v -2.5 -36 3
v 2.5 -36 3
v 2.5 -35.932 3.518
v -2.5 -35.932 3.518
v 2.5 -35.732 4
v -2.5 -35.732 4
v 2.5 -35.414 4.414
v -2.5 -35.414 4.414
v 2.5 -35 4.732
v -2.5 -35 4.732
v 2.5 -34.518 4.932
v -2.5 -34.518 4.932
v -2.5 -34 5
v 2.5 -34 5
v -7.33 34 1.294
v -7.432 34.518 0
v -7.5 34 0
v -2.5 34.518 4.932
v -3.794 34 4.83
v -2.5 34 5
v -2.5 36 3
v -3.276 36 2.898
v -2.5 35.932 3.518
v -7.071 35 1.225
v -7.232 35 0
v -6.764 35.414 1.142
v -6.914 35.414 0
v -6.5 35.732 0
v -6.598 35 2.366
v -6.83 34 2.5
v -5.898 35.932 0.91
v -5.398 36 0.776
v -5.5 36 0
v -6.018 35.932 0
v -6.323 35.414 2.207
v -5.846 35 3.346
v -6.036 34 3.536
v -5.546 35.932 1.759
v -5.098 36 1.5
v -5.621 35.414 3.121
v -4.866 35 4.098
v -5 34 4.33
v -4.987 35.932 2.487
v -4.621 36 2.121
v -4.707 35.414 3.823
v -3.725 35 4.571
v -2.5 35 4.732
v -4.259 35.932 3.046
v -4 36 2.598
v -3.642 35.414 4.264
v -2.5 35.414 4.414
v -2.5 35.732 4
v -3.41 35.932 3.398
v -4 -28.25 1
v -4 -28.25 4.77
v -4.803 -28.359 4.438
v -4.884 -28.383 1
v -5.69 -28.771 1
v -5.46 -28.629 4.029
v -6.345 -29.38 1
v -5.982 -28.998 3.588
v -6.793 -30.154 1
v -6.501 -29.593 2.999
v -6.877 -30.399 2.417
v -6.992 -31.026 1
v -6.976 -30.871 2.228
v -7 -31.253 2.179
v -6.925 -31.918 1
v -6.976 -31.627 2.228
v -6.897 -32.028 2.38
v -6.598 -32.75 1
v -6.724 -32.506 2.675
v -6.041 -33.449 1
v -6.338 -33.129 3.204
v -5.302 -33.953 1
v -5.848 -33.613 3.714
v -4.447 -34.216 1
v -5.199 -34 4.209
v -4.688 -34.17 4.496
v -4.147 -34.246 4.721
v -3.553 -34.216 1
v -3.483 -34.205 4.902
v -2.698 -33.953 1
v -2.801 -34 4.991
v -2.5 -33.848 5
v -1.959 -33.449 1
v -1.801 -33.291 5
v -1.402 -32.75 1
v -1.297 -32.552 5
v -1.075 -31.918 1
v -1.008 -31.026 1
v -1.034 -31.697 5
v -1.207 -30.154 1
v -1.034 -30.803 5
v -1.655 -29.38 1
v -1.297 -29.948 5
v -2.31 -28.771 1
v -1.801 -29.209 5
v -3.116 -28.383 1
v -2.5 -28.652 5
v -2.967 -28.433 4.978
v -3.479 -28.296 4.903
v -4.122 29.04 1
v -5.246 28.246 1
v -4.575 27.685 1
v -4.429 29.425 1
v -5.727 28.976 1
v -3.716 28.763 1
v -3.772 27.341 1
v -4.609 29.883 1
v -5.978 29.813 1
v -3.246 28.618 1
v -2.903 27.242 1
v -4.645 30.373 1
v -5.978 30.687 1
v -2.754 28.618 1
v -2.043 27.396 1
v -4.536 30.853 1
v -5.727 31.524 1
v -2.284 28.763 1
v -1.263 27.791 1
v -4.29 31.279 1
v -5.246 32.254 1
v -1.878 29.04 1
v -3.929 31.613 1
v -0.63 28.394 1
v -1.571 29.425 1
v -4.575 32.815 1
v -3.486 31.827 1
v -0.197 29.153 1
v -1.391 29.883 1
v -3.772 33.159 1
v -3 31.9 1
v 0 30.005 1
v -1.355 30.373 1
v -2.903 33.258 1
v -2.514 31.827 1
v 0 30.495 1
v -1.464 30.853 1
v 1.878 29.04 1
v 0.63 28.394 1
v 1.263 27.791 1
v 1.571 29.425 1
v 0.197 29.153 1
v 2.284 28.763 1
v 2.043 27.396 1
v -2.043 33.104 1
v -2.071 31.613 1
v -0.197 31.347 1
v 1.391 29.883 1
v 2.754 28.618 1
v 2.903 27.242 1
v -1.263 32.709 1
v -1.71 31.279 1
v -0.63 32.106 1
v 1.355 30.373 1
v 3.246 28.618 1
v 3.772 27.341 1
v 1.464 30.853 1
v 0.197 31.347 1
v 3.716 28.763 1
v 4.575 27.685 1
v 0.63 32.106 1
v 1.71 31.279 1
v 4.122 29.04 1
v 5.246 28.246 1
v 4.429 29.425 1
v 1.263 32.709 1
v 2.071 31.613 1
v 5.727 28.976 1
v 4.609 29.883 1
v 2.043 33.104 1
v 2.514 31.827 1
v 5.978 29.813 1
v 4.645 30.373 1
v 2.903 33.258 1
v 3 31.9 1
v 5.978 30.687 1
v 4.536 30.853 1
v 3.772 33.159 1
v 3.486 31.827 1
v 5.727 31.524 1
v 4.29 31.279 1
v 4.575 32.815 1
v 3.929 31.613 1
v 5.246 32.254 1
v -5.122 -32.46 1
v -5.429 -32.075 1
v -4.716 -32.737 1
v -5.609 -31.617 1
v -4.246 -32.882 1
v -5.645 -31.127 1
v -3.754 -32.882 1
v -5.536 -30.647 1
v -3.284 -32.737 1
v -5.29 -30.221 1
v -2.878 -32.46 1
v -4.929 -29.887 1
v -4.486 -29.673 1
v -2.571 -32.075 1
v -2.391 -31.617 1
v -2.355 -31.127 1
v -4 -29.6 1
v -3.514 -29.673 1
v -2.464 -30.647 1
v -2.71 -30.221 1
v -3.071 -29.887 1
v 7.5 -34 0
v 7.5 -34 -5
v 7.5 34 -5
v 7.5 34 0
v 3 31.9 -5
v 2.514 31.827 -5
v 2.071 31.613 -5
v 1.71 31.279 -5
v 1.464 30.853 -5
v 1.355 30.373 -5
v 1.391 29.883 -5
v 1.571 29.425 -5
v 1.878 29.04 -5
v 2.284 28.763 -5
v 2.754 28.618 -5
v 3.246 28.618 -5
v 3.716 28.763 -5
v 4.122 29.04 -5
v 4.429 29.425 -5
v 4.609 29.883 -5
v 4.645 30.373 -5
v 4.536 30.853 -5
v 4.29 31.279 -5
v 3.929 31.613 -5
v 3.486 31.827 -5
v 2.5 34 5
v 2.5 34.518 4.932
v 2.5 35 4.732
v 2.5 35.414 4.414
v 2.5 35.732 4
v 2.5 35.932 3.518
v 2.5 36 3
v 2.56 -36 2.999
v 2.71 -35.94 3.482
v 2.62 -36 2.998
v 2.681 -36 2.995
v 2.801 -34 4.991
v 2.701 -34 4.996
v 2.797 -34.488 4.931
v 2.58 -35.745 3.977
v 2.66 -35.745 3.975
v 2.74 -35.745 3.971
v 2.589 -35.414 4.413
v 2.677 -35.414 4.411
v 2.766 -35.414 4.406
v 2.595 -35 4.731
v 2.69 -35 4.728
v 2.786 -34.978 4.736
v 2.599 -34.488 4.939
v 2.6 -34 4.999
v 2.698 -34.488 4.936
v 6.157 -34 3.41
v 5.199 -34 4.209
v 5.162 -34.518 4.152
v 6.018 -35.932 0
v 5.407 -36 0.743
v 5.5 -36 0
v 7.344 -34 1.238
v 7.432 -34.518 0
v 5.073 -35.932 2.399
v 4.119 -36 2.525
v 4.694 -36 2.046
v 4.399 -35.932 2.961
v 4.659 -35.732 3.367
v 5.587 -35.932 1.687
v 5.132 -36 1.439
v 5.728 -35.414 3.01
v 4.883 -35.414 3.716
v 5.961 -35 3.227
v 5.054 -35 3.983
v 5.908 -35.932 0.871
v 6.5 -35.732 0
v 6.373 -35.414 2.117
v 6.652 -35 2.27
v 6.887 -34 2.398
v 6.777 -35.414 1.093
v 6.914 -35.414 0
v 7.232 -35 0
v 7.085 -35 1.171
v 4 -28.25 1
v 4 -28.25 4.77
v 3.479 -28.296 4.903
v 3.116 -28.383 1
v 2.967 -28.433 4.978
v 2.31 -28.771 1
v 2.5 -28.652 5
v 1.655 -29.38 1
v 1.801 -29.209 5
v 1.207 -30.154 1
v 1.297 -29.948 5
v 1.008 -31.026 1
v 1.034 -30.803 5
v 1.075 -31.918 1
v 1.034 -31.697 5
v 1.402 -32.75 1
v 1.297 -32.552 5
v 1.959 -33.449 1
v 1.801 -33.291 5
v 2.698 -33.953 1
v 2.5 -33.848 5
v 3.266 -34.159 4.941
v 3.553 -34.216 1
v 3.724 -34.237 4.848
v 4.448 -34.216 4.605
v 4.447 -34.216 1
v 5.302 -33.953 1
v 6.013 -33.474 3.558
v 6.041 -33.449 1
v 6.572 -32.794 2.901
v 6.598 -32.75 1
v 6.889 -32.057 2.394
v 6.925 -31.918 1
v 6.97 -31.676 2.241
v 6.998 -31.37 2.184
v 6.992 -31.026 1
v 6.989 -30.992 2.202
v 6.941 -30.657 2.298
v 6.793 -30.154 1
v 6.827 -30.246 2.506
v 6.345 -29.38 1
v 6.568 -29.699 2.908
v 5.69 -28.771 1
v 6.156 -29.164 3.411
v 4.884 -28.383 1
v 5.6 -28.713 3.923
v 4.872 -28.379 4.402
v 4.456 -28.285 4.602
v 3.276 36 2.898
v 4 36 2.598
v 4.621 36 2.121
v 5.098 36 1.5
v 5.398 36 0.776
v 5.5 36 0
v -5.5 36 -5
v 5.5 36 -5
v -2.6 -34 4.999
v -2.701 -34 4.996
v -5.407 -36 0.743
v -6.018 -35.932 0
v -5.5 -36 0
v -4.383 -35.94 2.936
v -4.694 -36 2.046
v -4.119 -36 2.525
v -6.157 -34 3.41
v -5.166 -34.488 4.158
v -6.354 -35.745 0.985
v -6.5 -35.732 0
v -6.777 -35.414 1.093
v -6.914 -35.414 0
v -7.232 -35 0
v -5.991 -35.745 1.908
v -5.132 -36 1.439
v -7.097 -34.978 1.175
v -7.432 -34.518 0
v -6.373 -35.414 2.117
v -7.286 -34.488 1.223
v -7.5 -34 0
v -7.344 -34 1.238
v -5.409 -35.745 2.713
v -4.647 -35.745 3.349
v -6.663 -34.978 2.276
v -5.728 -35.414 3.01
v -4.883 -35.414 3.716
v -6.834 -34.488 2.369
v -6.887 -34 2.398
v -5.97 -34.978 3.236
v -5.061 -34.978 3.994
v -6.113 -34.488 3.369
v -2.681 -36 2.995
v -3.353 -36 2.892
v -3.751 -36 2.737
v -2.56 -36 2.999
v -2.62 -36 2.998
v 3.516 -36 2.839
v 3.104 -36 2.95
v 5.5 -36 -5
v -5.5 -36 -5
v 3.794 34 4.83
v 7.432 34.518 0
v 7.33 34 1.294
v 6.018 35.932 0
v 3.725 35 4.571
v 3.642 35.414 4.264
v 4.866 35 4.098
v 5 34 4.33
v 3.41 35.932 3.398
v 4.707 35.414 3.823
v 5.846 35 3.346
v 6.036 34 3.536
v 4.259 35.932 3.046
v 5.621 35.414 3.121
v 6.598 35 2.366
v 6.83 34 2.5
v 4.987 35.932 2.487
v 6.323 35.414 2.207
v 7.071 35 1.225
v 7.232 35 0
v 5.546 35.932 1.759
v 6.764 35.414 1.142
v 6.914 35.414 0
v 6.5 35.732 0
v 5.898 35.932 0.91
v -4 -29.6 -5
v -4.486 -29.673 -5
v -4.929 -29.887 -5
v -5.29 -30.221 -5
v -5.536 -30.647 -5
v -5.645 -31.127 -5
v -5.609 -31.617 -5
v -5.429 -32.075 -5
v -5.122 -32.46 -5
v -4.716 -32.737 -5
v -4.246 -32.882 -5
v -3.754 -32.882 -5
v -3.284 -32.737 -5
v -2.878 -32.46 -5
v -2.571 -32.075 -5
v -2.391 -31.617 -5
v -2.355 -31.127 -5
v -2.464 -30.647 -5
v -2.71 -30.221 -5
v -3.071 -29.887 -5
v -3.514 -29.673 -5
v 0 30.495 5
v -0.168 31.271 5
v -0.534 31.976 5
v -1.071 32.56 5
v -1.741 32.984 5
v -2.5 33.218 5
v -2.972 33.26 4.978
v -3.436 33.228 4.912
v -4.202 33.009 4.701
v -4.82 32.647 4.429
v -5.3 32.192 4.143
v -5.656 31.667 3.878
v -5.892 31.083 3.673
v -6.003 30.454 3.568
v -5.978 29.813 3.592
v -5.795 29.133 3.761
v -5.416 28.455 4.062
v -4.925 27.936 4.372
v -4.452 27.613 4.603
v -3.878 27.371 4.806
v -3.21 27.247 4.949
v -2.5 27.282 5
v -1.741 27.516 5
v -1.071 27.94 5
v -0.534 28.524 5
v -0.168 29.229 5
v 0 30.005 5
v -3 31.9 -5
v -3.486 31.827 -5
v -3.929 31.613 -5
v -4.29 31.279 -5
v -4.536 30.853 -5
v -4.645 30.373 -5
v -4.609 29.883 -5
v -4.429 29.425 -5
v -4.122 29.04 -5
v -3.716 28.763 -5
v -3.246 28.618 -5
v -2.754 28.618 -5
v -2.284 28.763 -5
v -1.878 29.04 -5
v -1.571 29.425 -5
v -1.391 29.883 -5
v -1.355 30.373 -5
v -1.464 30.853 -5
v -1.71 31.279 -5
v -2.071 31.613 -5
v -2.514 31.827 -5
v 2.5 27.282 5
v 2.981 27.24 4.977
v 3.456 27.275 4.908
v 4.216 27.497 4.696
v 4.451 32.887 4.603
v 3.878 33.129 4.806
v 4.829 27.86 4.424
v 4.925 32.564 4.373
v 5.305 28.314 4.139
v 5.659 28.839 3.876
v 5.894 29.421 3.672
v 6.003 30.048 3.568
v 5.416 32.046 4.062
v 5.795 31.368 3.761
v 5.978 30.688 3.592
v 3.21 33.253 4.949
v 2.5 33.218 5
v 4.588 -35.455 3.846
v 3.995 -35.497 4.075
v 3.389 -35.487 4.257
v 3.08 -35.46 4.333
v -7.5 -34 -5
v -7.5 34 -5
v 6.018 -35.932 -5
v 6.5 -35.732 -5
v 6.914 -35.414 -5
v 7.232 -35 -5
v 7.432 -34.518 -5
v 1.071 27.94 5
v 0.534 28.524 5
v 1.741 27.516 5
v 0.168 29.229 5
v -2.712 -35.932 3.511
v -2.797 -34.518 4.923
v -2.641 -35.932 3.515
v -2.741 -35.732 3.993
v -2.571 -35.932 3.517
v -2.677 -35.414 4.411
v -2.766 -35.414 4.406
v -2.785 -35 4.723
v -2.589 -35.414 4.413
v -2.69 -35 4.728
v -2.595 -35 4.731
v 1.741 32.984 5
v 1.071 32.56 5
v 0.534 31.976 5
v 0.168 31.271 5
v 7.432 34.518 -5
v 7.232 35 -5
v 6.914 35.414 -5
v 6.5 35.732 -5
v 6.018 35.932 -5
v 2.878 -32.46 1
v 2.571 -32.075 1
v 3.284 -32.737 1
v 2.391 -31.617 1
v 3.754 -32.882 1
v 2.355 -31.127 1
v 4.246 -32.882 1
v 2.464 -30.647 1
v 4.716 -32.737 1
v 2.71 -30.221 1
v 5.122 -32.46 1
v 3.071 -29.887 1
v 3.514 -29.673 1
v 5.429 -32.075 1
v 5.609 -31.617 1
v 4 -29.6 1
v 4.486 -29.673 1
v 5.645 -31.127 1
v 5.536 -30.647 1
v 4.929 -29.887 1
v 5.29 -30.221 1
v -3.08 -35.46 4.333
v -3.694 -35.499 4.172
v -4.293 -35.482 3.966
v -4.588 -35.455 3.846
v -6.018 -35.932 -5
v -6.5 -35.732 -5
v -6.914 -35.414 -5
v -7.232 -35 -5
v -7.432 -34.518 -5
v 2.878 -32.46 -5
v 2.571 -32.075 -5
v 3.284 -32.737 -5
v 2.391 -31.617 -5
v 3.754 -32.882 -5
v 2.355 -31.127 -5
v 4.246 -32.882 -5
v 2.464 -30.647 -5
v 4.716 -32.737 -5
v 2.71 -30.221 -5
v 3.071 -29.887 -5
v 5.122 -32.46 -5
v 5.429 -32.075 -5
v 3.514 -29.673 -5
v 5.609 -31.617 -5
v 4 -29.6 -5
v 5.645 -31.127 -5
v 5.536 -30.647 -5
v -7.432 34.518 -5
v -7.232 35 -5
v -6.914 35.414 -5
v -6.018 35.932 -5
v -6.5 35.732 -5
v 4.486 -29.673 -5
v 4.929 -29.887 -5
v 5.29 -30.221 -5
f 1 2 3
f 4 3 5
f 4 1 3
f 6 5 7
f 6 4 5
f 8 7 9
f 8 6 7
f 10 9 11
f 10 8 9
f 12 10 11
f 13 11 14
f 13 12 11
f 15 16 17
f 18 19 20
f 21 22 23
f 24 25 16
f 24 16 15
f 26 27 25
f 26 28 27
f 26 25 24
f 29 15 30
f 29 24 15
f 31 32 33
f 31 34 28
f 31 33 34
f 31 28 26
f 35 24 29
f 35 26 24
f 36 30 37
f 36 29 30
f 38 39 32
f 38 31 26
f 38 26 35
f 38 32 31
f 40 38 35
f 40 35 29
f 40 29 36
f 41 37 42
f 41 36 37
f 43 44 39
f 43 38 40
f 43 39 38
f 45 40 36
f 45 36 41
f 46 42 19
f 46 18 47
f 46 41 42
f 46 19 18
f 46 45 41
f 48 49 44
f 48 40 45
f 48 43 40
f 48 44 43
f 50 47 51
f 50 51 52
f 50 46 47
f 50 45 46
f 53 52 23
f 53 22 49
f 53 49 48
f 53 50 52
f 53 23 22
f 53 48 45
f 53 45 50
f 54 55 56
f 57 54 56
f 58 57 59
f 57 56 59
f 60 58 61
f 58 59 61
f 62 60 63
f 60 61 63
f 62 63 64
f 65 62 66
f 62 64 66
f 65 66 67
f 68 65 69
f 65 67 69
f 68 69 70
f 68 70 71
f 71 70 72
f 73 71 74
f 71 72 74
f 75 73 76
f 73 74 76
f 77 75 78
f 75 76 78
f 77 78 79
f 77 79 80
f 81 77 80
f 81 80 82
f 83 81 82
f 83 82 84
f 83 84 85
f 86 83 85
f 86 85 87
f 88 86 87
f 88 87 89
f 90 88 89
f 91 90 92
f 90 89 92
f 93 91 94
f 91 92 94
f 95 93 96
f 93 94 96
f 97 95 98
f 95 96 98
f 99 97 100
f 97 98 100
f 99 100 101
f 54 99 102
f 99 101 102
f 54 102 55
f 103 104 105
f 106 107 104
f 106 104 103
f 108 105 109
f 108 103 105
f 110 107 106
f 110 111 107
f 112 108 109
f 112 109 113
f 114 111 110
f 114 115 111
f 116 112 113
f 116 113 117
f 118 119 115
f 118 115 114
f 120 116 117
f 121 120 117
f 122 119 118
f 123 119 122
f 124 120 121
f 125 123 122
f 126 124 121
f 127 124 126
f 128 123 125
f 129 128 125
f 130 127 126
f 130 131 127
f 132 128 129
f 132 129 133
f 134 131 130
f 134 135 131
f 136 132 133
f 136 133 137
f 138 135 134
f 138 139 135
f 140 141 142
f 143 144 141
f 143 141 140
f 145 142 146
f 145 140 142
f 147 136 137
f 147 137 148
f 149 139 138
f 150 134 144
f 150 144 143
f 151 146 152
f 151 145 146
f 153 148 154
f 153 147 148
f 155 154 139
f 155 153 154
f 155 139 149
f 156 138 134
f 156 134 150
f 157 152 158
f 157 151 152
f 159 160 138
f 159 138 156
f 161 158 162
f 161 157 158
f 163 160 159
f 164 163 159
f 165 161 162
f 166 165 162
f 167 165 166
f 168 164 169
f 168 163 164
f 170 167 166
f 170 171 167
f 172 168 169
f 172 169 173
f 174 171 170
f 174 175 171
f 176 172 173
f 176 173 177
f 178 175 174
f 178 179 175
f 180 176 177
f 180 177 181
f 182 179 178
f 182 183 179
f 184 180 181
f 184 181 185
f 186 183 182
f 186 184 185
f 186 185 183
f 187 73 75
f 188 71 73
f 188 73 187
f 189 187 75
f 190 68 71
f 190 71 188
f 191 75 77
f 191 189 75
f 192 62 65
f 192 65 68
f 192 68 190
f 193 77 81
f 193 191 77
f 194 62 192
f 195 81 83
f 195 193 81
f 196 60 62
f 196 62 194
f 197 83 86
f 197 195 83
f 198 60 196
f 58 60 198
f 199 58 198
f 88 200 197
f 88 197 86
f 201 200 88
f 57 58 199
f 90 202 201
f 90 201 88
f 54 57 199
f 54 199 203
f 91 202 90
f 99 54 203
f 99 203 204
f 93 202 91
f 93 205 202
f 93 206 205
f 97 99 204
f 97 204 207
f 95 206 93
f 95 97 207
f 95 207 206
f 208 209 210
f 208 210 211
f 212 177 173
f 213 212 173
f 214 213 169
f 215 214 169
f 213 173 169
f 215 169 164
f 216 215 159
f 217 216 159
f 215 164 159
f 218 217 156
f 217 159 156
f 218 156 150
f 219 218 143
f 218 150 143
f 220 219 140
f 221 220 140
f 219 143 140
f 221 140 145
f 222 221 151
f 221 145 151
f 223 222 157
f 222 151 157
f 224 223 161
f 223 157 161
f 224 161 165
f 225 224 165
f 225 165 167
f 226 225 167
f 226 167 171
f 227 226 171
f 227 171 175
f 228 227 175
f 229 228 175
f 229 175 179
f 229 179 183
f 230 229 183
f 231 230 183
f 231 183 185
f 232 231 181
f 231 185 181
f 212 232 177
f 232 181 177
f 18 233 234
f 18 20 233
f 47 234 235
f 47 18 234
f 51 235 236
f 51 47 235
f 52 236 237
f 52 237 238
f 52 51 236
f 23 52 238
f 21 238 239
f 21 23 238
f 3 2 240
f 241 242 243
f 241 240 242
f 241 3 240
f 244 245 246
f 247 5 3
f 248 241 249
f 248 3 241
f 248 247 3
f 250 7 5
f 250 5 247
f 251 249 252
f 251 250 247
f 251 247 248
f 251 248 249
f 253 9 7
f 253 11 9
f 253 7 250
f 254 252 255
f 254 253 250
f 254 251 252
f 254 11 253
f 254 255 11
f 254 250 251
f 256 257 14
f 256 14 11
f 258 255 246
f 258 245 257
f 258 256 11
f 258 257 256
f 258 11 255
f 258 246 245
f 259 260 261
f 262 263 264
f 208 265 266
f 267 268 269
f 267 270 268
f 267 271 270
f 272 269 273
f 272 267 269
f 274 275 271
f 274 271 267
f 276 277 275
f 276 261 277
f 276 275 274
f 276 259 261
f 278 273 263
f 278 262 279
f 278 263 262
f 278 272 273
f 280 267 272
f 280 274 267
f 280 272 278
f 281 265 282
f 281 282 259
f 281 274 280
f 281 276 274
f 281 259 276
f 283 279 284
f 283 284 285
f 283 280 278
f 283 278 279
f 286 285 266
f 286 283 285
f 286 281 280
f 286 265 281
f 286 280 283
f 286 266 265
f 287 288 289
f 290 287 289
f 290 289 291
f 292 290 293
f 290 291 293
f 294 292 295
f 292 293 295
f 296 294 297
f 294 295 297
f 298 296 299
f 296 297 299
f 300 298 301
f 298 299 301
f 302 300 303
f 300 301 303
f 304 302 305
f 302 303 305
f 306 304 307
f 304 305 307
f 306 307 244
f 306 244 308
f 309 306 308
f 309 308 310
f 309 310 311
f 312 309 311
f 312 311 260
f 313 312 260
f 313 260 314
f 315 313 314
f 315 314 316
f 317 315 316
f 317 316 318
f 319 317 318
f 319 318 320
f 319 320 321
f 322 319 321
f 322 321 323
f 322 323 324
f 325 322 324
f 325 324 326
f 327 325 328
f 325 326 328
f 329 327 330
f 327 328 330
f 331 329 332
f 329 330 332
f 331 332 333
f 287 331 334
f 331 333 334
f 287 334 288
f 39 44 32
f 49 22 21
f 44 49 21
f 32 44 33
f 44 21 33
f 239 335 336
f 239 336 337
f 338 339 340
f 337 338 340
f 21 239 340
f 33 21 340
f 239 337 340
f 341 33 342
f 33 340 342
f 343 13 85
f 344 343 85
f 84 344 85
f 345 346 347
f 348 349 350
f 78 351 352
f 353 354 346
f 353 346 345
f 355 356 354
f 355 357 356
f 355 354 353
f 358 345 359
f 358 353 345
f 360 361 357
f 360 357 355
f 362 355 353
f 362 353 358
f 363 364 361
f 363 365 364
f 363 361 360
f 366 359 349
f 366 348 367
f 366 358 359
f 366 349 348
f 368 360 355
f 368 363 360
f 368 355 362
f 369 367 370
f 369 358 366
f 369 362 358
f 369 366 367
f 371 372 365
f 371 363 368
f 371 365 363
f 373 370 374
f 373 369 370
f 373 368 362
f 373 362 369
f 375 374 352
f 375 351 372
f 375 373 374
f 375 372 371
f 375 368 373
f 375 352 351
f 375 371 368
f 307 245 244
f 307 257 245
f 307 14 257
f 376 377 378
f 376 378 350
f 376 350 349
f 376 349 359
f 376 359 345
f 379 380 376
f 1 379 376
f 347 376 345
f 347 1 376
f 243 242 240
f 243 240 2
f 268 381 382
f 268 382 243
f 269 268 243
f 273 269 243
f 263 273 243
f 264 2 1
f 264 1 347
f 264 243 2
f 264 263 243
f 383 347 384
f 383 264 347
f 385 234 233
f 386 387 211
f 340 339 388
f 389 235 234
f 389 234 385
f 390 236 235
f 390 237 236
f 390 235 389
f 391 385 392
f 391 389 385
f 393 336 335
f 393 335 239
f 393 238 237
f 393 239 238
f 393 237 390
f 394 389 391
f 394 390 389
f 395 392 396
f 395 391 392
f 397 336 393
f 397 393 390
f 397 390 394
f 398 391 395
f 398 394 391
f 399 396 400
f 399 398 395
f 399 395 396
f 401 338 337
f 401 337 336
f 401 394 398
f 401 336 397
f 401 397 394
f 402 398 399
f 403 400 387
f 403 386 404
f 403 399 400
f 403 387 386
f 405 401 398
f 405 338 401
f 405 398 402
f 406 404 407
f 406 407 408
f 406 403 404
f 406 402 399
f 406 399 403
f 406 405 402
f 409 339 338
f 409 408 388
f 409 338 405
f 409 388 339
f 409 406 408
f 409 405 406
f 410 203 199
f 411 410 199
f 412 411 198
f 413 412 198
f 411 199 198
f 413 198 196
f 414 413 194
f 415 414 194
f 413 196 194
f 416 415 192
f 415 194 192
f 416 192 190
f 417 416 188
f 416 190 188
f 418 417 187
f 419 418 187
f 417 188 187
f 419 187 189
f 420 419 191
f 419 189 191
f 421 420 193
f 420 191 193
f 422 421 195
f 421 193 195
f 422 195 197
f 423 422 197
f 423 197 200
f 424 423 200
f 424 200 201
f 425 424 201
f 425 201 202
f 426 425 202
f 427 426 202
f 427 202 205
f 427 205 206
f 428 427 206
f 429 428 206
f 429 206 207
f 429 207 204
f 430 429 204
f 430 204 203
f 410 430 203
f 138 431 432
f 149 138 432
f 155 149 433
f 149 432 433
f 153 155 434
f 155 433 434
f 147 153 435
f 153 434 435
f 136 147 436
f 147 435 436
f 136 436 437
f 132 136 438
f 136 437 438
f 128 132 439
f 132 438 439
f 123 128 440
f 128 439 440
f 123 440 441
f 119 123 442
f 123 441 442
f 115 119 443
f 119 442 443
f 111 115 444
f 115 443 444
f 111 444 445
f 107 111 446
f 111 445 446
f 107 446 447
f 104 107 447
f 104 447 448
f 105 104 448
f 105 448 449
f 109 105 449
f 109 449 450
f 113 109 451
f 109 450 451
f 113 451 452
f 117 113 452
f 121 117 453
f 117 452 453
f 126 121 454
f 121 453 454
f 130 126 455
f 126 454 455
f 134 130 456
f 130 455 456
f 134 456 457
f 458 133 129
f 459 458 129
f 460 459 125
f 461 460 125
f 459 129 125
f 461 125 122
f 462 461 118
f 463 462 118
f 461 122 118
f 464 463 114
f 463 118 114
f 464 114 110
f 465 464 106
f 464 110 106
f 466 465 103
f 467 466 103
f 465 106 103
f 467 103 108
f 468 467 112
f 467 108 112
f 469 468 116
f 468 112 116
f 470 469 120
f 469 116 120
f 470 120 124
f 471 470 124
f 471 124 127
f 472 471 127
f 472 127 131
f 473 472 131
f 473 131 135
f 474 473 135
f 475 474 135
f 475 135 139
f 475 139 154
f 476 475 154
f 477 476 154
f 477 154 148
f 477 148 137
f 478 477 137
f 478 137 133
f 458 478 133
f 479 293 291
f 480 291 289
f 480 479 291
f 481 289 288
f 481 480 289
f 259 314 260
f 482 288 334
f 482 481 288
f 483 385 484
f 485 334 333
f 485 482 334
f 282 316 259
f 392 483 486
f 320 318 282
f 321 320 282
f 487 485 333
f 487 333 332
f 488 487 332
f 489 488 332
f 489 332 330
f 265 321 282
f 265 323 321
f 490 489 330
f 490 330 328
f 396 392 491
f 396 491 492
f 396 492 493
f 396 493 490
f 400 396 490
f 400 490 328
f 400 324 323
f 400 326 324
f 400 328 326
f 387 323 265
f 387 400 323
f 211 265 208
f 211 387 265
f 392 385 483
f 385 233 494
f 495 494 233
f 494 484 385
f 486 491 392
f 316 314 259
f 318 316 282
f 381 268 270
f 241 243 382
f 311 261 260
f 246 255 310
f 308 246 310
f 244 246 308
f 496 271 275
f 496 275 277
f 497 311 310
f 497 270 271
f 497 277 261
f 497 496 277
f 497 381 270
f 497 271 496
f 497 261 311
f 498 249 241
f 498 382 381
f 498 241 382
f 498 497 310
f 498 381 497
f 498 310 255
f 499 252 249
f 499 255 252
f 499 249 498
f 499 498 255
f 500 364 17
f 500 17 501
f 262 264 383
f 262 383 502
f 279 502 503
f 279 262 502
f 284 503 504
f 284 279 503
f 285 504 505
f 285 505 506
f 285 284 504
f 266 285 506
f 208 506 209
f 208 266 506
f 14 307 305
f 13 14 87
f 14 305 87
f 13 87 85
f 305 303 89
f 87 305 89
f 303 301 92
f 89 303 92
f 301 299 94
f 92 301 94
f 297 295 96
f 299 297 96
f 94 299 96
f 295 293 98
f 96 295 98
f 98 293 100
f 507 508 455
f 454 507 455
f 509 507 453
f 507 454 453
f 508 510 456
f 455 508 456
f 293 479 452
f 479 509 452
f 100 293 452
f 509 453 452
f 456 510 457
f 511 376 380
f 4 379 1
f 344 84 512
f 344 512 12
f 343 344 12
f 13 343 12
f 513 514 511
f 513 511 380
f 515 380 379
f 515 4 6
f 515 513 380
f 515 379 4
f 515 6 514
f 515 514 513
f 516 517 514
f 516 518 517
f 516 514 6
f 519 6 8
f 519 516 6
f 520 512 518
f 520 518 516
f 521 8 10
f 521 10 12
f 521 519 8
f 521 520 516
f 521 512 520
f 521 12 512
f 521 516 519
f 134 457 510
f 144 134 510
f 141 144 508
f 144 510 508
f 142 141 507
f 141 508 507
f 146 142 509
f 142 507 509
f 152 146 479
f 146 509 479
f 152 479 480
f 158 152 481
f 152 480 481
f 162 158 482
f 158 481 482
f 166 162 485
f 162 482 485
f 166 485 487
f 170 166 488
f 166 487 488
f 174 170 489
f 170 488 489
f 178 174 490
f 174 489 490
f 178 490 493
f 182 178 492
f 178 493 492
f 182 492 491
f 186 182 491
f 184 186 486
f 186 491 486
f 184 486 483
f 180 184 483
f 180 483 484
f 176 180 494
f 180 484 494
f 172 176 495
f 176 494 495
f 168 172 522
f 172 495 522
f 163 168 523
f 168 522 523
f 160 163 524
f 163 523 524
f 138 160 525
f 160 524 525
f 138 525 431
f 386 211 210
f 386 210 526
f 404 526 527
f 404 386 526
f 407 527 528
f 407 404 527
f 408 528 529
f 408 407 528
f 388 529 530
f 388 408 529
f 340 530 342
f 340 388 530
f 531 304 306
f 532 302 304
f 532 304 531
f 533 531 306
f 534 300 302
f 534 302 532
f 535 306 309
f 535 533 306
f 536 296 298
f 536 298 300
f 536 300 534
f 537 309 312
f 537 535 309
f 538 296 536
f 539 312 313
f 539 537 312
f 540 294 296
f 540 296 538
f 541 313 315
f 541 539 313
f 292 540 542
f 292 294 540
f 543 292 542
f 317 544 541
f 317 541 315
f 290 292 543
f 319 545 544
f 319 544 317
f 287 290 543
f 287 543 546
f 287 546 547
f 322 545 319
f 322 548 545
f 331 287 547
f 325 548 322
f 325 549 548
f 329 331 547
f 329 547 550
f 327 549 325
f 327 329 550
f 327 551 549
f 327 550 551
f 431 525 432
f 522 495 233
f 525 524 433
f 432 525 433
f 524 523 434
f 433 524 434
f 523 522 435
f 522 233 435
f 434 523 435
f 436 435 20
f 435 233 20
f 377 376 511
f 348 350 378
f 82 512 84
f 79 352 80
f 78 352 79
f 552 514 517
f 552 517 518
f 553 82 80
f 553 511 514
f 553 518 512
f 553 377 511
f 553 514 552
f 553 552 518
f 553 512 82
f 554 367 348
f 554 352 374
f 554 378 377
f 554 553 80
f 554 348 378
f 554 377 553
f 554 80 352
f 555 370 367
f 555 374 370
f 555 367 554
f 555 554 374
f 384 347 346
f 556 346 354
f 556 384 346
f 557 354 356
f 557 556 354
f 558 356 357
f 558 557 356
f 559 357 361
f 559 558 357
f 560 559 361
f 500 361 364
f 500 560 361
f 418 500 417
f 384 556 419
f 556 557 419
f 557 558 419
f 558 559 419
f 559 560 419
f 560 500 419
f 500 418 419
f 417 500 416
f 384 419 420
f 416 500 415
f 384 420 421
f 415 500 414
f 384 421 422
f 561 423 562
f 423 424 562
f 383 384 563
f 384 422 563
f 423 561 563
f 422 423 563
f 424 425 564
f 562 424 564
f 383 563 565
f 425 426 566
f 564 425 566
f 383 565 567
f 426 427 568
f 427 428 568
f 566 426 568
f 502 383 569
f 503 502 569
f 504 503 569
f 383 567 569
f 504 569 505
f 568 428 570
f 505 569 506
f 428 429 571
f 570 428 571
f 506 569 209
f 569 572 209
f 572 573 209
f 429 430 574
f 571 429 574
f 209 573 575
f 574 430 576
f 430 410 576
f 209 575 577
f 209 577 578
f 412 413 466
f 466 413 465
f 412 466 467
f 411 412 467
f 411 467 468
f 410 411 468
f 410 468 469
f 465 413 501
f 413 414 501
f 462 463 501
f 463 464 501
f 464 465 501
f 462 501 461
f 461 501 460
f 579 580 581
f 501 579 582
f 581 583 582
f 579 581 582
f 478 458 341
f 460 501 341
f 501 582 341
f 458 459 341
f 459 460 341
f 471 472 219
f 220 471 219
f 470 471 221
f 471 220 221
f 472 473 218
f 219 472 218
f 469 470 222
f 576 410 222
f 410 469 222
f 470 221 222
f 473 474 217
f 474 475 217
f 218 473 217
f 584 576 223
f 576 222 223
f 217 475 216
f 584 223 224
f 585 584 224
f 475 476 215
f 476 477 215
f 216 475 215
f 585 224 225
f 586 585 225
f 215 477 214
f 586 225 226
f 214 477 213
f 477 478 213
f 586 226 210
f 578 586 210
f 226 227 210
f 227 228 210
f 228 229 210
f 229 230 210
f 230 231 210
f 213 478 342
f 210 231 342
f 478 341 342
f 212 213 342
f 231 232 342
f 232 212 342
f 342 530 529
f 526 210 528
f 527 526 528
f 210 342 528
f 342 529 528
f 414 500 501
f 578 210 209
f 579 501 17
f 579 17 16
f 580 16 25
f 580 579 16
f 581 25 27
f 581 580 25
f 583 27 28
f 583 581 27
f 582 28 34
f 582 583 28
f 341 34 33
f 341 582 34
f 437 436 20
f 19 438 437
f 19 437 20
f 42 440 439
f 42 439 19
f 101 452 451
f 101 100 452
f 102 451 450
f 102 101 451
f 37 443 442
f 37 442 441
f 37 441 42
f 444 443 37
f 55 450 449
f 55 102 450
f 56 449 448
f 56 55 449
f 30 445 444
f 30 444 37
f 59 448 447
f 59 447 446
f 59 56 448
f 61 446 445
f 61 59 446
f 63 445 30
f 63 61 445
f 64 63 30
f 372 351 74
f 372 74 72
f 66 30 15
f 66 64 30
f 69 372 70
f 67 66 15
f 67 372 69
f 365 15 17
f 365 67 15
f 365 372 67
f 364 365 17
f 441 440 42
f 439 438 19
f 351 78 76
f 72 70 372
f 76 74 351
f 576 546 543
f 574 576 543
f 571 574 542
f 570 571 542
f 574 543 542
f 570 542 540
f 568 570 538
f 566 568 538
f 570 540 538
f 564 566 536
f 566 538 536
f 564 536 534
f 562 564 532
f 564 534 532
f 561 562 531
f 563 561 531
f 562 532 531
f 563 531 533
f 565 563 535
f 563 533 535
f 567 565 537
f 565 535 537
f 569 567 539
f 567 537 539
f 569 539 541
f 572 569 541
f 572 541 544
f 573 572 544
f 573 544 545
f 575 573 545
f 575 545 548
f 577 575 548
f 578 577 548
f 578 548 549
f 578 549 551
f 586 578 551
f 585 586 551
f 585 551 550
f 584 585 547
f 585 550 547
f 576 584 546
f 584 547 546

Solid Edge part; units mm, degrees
sketch "Sketch1" plane through (0, 0, 0) normal (0, -1, 0) x (1, 0, 0)
  line L0 (-7.5, -5) -> (7.5, -5)
  line L1 (7.5, -5) -> (7.5, 5)
  line L2 (7.5, 5) -> (-7.5, 5)
  line L3 (-7.5, 5) -> (-7.5, -5)
  dimension "D1" = 15
  dimension "D2" = 10
extrude "Protrusion1" add sketch "Sketch1" along normal mid plane 72
sketch "Sketch2" plane through (0, 0, 5) normal (0, 0, 1) x (0, 1, 0)
  circle A0 centre (30.25, -3) radius 1.65
  circle A1 centre (-31.25, -4) radius 1.65
  circle A2 centre (-31.25, 4) radius 1.65
  circle A3 centre (30.25, 3) radius 1.65
  dimension "D1" = 44.5
  dimension "D2" = 9
  dimension "D3" = 3
  dimension "D4" = 8
  dimension "D5" = 8
  dimension "D6" = 4
  dimension "D7" = 4
  dimension "D8" = 3
extrude "Cutout1" cut sketch "Sketch2" against normal through all
fillet "Redondeo_1" radius 5 2 edges at (7.5, 0, 5) (-7.5, 0, 5)
sketch "Sketch3" plane through (0, 0, 5) normal (0, 0, 1) x (0, 1, 0)
  circle A0 centre (-31.25, 4) radius 3
  circle A1 centre (30.25, 3) radius 3.01
  circle A2 centre (-31.25, -4) radius 3
  circle A3 centre (30.25, -3) radius 3.01
extrude "VaciadoExtruido_3" cut sketch "Sketch3" against normal blind 4
fillet "Redondeo_2" radius 2 10 edges at (-7.5, 36, -2.5) (-6.0355, 36, 3.5355) (0, 36, 5) (6.0355, 36, 3.5355) (7.5, 36, -2.5) (0, -36, 5) (-6.0355, -36, 3.5355) (-7.5, -36, -2.5) (6.0355, -36, 3.5355) (7.5, -36, -2.5)
